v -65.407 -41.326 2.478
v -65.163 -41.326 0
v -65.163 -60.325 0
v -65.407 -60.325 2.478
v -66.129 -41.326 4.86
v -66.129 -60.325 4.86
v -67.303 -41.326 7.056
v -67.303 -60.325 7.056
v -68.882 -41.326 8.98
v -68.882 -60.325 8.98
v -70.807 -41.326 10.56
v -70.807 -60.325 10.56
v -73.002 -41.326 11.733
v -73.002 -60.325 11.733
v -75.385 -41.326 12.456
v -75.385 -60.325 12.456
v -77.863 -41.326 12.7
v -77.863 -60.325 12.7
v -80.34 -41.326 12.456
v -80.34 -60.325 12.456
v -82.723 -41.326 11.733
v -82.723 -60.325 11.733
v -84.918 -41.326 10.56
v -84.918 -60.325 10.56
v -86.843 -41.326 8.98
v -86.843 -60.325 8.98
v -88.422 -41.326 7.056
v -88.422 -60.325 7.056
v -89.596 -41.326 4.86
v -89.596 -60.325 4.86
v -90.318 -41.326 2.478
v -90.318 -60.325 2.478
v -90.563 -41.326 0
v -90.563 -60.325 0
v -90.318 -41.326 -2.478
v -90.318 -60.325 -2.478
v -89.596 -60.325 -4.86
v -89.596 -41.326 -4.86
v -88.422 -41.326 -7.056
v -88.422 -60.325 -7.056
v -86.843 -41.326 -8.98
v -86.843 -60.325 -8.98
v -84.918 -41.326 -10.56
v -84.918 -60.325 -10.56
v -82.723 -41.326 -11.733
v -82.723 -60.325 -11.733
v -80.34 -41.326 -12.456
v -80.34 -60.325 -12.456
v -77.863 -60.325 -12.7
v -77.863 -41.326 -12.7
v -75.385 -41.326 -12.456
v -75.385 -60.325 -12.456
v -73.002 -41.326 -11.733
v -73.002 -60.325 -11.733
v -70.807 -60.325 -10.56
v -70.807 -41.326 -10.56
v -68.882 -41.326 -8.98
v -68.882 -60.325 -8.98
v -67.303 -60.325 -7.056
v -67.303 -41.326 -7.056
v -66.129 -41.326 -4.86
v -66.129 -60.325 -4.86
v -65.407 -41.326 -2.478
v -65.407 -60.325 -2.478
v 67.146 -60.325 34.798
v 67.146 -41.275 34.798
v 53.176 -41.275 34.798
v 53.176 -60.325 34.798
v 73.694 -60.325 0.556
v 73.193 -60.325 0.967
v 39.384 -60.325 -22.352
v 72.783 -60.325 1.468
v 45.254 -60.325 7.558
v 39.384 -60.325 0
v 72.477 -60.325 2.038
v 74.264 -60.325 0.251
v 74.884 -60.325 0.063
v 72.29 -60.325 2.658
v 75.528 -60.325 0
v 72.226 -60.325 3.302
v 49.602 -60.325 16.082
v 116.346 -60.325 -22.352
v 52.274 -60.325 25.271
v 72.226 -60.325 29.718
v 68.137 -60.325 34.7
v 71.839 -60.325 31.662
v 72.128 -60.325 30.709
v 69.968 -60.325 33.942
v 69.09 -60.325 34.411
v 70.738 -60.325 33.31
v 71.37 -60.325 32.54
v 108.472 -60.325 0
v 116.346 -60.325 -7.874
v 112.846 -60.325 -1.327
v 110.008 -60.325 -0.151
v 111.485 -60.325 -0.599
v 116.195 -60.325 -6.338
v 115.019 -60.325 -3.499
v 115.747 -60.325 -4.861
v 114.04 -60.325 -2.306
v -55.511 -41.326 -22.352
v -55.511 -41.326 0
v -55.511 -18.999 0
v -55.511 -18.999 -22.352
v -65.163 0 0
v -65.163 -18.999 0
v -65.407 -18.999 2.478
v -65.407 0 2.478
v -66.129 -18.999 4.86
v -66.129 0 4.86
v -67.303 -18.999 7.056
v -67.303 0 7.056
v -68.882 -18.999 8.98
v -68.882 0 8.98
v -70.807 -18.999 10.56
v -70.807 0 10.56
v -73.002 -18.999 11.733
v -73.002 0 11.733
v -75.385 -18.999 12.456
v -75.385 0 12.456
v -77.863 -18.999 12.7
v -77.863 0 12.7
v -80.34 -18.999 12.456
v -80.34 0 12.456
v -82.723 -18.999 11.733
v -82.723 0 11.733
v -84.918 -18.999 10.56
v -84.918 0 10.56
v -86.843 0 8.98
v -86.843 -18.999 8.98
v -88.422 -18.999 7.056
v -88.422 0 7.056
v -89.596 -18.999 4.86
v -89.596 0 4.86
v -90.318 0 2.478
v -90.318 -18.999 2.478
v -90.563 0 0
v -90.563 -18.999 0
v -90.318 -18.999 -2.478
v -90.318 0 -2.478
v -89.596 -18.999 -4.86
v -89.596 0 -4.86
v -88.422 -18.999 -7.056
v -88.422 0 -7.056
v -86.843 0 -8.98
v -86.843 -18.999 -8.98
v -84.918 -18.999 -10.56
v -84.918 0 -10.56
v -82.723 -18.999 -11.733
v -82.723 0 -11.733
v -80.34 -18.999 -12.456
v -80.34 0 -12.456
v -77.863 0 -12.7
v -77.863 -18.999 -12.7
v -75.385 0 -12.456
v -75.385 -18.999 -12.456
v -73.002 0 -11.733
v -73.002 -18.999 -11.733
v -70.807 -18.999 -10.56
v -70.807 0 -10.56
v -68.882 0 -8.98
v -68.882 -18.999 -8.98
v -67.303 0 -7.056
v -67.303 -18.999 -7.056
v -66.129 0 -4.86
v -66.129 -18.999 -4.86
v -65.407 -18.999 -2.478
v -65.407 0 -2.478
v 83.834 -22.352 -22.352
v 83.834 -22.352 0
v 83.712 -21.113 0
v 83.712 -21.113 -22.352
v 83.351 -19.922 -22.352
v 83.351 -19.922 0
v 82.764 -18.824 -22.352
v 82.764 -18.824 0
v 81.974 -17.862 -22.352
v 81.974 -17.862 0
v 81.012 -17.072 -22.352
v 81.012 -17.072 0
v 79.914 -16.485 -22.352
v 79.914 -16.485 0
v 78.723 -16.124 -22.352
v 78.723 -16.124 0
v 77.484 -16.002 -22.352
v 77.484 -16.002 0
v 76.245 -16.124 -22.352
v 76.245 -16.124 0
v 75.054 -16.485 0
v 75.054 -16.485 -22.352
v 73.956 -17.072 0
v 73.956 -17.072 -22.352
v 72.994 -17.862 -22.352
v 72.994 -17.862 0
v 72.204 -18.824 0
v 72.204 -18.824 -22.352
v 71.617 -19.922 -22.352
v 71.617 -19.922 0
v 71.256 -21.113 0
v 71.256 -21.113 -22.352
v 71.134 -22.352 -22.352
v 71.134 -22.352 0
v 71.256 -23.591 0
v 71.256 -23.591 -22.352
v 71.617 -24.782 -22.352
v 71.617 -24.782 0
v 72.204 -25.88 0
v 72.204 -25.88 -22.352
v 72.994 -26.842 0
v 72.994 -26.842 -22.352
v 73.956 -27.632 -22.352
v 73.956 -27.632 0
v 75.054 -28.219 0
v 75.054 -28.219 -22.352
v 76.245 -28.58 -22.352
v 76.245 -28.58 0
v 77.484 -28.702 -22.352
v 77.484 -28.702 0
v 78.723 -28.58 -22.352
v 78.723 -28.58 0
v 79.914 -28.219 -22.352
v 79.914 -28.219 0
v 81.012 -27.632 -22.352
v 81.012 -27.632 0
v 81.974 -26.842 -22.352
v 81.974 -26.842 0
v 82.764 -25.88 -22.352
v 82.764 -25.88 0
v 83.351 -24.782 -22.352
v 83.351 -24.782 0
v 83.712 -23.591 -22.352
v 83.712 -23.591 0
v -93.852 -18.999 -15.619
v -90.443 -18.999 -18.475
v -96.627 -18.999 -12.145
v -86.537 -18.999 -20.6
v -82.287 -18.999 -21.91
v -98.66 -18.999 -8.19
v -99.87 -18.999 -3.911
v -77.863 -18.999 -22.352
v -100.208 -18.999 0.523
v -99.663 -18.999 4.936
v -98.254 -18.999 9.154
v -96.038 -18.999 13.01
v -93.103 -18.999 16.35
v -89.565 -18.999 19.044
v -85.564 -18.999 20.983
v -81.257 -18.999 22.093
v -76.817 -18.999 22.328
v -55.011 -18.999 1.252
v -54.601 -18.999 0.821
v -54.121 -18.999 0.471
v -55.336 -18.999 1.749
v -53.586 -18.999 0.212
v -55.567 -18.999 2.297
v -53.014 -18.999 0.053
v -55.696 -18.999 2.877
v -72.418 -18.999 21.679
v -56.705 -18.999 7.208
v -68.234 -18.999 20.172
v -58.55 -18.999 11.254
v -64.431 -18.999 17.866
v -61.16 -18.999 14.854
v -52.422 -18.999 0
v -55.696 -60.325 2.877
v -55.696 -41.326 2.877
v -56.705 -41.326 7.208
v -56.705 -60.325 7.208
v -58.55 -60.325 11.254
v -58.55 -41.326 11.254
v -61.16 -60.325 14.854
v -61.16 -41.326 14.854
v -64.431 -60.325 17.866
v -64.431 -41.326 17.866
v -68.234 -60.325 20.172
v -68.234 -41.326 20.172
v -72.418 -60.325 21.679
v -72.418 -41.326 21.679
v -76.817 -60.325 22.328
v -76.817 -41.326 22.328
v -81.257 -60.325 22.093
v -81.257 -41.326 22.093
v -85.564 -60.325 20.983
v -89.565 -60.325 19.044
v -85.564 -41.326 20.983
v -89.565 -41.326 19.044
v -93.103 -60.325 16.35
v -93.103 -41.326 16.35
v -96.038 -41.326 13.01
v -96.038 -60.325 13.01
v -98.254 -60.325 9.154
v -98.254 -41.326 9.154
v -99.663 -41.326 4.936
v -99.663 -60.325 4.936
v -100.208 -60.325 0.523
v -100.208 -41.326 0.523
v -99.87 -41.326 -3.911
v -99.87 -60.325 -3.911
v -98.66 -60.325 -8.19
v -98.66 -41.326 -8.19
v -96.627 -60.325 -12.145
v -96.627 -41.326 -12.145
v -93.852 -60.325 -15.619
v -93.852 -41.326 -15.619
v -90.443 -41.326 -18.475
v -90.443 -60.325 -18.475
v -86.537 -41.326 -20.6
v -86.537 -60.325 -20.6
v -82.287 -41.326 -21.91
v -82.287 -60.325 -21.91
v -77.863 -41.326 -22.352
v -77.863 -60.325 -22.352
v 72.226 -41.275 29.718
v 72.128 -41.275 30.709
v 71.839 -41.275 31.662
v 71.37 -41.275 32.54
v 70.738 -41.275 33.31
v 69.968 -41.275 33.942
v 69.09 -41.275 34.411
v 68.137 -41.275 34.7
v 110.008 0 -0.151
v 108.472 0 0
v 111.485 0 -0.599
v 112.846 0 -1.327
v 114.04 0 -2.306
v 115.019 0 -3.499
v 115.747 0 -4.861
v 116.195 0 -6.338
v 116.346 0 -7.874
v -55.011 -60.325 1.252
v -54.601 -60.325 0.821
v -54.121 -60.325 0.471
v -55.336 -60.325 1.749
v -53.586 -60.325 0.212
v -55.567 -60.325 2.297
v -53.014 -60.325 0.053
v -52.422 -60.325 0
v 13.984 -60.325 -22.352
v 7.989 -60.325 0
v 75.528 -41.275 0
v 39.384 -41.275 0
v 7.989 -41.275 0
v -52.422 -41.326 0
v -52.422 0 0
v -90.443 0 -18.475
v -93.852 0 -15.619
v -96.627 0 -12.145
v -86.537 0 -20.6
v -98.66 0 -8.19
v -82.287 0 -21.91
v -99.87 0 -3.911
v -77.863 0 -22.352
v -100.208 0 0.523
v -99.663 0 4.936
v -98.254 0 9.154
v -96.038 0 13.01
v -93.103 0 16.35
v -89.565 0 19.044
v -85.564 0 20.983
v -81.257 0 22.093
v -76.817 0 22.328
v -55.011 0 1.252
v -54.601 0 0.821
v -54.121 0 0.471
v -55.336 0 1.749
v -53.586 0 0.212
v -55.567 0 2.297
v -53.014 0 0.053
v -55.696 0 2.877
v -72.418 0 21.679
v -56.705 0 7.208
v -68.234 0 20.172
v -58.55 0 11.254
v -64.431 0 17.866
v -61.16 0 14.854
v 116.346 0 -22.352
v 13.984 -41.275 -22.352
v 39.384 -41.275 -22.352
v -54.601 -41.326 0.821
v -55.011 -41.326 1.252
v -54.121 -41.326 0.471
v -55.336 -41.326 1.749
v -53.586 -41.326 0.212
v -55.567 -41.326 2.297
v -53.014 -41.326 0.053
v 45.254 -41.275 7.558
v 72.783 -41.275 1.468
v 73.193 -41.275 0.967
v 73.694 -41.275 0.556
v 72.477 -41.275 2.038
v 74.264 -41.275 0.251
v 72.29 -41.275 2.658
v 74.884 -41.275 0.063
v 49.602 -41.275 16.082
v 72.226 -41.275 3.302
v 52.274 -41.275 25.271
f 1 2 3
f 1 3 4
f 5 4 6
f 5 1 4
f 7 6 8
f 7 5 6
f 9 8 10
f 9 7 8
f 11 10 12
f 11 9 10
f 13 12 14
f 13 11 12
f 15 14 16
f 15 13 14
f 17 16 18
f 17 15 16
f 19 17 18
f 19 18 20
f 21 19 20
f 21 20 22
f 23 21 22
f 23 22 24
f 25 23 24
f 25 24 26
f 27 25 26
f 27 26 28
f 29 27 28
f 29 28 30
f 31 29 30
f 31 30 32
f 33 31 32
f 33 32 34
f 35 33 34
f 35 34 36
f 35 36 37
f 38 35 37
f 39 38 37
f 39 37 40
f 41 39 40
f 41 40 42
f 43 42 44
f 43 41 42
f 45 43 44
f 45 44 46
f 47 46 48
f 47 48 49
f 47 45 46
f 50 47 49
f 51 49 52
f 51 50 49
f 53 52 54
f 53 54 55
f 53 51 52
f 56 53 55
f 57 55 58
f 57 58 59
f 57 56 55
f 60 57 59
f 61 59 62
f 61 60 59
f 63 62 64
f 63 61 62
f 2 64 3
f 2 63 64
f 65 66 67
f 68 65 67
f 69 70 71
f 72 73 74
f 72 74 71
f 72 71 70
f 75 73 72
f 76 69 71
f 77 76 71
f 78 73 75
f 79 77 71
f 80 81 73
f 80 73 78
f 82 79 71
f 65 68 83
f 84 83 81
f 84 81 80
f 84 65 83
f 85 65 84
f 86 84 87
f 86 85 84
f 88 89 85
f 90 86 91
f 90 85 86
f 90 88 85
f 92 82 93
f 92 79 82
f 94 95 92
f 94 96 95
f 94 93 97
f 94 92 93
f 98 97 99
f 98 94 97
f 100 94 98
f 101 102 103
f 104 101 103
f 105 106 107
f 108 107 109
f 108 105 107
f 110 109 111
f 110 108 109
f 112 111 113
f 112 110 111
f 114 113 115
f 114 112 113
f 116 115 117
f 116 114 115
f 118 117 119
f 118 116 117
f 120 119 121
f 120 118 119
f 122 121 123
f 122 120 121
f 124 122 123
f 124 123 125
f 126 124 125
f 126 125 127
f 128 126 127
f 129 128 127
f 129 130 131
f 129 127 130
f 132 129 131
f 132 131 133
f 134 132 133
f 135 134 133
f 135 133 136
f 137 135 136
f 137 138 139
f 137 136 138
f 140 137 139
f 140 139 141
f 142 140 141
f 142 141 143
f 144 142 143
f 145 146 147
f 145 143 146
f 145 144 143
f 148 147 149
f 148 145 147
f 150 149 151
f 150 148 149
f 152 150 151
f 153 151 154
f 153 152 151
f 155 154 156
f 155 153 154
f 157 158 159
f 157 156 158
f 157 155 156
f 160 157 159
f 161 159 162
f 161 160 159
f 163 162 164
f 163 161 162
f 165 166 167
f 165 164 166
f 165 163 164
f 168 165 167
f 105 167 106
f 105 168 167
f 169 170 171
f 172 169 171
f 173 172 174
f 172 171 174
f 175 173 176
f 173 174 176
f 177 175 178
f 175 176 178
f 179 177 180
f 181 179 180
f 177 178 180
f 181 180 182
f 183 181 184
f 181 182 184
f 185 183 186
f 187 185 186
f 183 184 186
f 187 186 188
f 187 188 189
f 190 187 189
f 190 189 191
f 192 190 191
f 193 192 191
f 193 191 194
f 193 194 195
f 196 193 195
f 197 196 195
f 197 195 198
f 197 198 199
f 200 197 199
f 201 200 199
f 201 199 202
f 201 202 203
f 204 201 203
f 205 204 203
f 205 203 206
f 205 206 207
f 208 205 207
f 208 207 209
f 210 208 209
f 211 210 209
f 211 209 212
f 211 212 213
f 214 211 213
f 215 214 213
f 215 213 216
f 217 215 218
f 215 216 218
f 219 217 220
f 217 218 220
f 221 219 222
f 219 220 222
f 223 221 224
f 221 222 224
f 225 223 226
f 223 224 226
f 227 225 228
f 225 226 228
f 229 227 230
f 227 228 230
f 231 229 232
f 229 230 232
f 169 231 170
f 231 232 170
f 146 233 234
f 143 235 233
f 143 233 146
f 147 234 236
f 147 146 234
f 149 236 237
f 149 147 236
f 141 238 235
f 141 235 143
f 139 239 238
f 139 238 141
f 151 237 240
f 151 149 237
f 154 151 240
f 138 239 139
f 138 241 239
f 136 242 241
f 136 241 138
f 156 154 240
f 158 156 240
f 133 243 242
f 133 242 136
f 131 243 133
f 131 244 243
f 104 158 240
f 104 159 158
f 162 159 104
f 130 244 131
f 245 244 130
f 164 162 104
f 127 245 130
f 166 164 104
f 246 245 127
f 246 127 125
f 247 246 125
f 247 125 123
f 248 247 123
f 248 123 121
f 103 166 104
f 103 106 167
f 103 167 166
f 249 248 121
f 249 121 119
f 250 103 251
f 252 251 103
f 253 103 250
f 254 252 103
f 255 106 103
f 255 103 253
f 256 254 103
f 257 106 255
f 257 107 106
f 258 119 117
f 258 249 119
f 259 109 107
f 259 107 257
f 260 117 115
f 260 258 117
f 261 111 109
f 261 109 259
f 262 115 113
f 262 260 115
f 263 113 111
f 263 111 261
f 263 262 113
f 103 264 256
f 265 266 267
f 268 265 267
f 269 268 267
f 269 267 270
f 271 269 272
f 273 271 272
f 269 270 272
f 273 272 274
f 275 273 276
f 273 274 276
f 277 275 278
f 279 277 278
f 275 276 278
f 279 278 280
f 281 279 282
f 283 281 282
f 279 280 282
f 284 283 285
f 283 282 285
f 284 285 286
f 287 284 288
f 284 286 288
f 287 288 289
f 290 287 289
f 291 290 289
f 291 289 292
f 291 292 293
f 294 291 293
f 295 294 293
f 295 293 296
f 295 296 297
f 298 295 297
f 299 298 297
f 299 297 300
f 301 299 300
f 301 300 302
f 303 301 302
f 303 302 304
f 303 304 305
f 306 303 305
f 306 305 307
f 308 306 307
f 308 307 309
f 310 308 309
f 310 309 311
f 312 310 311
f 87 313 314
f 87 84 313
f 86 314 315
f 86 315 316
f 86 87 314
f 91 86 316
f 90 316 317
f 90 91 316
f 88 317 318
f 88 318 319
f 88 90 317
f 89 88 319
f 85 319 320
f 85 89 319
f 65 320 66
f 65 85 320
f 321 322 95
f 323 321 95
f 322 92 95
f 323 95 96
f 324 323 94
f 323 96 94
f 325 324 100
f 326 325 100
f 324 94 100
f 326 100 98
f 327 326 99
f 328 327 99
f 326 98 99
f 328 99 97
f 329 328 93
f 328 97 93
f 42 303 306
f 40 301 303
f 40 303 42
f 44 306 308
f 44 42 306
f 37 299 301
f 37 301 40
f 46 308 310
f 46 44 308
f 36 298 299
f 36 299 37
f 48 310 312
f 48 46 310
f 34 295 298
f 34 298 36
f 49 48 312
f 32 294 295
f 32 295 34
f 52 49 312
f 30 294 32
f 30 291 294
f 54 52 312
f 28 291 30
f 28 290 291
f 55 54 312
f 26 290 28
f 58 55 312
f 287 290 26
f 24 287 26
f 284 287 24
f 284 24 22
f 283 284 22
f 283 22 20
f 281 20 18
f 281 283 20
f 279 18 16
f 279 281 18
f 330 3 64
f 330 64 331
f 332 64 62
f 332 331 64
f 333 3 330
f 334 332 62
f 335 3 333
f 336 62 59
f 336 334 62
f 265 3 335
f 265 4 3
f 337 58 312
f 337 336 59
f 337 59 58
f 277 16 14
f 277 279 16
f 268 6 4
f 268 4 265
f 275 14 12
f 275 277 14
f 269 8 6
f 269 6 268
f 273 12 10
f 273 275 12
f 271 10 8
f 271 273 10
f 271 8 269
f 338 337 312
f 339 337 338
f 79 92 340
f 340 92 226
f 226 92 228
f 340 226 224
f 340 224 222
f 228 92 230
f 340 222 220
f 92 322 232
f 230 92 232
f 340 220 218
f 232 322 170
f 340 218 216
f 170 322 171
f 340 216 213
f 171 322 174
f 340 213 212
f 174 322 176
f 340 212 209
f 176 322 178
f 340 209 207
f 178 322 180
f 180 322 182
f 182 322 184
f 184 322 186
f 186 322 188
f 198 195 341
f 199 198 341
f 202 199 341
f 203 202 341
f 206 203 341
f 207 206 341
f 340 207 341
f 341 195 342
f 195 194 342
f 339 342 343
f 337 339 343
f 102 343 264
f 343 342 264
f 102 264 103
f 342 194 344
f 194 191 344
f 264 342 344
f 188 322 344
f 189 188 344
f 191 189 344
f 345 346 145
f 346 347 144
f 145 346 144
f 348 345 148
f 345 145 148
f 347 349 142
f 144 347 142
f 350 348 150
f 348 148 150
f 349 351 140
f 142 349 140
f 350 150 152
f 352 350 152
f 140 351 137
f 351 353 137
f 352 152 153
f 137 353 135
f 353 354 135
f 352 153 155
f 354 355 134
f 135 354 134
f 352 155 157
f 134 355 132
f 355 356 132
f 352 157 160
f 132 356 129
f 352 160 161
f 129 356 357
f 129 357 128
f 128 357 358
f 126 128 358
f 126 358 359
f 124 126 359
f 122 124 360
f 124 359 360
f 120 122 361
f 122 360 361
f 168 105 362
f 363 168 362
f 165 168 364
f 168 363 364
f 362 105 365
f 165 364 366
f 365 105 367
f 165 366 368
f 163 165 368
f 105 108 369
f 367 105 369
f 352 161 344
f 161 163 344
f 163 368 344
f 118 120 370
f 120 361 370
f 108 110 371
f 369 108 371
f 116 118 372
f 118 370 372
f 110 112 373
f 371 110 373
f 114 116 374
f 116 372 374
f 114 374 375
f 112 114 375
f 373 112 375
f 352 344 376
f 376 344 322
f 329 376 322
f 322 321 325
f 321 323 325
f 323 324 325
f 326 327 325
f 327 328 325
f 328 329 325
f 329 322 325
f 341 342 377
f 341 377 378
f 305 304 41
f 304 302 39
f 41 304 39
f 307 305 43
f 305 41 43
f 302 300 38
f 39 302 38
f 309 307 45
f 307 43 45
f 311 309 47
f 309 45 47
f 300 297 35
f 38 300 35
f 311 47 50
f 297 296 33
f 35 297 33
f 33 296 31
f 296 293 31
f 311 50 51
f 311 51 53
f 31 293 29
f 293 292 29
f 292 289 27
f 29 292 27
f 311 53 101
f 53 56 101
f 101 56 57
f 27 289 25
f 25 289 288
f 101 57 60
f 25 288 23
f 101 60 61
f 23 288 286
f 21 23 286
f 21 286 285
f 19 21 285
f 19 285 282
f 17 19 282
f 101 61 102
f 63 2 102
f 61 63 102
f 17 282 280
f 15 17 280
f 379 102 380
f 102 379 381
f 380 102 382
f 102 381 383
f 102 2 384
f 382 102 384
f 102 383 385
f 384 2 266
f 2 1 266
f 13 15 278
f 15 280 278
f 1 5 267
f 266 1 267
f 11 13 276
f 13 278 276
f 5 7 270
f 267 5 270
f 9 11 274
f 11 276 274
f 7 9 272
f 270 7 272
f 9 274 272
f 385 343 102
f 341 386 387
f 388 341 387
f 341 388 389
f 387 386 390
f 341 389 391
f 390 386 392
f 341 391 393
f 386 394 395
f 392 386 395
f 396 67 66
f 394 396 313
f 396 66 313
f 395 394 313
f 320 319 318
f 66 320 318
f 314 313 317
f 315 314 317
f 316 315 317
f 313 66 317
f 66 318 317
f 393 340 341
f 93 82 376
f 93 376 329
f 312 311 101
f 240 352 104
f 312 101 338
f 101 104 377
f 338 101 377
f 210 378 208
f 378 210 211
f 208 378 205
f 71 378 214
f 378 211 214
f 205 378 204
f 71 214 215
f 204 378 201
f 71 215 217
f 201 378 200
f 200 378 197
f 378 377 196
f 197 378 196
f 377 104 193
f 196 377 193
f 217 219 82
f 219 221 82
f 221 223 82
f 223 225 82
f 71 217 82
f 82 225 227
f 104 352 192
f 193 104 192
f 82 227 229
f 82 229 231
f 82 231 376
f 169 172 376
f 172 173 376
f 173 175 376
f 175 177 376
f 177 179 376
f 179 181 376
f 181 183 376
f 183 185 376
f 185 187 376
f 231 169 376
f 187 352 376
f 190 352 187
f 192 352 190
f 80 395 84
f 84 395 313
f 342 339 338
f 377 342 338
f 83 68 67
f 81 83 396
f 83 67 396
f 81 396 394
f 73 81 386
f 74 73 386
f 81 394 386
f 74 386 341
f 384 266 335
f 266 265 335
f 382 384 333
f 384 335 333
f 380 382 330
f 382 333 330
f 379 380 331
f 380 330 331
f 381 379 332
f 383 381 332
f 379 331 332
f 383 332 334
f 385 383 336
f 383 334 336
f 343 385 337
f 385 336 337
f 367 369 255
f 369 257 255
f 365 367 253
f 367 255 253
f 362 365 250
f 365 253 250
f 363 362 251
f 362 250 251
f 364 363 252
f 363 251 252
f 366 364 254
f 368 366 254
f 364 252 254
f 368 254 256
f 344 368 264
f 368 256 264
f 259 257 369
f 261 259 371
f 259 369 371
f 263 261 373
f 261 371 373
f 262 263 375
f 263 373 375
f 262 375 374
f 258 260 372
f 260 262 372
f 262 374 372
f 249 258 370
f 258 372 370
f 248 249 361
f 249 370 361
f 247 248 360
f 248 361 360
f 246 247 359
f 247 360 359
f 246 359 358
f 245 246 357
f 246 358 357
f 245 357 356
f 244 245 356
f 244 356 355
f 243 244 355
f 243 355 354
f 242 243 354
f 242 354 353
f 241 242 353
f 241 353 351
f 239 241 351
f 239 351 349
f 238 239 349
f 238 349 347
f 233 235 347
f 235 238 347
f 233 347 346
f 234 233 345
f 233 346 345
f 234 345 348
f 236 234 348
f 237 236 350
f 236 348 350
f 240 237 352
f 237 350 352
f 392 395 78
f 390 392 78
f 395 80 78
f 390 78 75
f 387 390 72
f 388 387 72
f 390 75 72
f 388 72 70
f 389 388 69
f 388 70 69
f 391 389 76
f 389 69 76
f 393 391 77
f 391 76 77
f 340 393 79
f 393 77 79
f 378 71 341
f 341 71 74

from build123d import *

# Parameters (mm, degrees)
F0_R     = 12.7
F1_DEPTH = 60.325
F3_DEPTH = 19.05
F4_W     = 32.8422
F4_H     = 41.275
F5_DEPTH = 34.798
F7_W     = 44.8917353029
F7_H     = 22.3266
F7_R     = 6.35
F8_DEPTH = 44.704
F9_R     = 3.302
F10_R    = 7.874
F11_R    = 5.08
F12_R    = 3.302


with BuildPart() as f1:
    # F0 (on Front) → F1 (new body)
    with BuildSketch(Plane.XZ):
        with BuildLine():
            ThreePointArc((-77.862515583, -22.352), (-62.0572648099, -15.8052507731), (-55.510515583, 0))
            ThreePointArc((-55.510515583, 0), (-93.6677663561, 15.8052507731), (-77.862515583, -22.352))
        make_face()
        with Locations((-77.862515583, 0)):
            Circle(F0_R, mode=Mode.SUBTRACT)
        with BuildLine():
            Line((39.383884417, 0), (-55.510515583, 0))
            ThreePointArc((-55.510515583, 0), (-62.0572648099, -15.8052507731), (-77.862515583, -22.352))
            Line((-77.862515583, -22.352), (116.345884417, -22.352))
            Line((116.345884417, -22.352), (116.345884417, 0))
            Line((116.345884417, 0), (72.226084417, 0))
            Line((72.226084417, 0), (72.226084417, 34.798))
            Line((72.226084417, 34.798), (53.176084417, 34.798))
            ThreePointArc((53.176084417, 34.798), (49.6018997785, 16.0823576341), (39.383884417, 0))
        make_face()
    extrude(amount=F1_DEPTH)

    # F2 (on face) → F3 (cut)
    with BuildSketch(Plane.XZ.offset(60.325)):
        Polygon((39.383884417, -22.352), (39.383884417, 0), (7.989484417, 0), (13.983884417, -22.352), align=None)
    extrude(amount=-F3_DEPTH, mode=Mode.SUBTRACT)

    # F4 (on face) → F5 (cut)
    with BuildSketch(Plane.XY.offset(34.798)):
        with Locations((55.804984417, -20.6375)):
            Rectangle(F4_W, F4_H)
    extrude(amount=-F5_DEPTH, mode=Mode.SUBTRACT)

    # F7 (on offset) → F8 (cut)
    with BuildSketch(Plane.XY.offset(22.352)):
        with Locations((-77.9563832345, -30.1625)):
            Rectangle(F7_W, F7_H)
        with Locations((77.483884417, -22.352)):
            Circle(F7_R)
    extrude(amount=-F8_DEPTH, mode=Mode.SUBTRACT)

    # F9
    f9_edges = [f1.edges().sort_by_distance(p)[0] for p in [
        (-55.510516, -50.8254, 0),
        (-55.510516, -9.4996, 0),
    ]]
    fillet(f9_edges, radius=F9_R)

    # F10
    f10_edges = [f1.edges().sort_by_distance(p)[0] for p in [
        (116.345884, -30.1625, 0),
    ]]
    fillet(f10_edges, radius=F10_R)

    # F11
    f11_edges = [f1.edges().sort_by_distance(p)[0] for p in [
        (72.226084, -50.8, 34.798),
    ]]
    fillet(f11_edges, radius=F11_R)

    # F12
    f12_edges = [f1.edges().sort_by_distance(p)[0] for p in [
        (72.226084, -50.8, 0),
    ]]
    fillet(f12_edges, radius=F12_R)


solid = f1.part
